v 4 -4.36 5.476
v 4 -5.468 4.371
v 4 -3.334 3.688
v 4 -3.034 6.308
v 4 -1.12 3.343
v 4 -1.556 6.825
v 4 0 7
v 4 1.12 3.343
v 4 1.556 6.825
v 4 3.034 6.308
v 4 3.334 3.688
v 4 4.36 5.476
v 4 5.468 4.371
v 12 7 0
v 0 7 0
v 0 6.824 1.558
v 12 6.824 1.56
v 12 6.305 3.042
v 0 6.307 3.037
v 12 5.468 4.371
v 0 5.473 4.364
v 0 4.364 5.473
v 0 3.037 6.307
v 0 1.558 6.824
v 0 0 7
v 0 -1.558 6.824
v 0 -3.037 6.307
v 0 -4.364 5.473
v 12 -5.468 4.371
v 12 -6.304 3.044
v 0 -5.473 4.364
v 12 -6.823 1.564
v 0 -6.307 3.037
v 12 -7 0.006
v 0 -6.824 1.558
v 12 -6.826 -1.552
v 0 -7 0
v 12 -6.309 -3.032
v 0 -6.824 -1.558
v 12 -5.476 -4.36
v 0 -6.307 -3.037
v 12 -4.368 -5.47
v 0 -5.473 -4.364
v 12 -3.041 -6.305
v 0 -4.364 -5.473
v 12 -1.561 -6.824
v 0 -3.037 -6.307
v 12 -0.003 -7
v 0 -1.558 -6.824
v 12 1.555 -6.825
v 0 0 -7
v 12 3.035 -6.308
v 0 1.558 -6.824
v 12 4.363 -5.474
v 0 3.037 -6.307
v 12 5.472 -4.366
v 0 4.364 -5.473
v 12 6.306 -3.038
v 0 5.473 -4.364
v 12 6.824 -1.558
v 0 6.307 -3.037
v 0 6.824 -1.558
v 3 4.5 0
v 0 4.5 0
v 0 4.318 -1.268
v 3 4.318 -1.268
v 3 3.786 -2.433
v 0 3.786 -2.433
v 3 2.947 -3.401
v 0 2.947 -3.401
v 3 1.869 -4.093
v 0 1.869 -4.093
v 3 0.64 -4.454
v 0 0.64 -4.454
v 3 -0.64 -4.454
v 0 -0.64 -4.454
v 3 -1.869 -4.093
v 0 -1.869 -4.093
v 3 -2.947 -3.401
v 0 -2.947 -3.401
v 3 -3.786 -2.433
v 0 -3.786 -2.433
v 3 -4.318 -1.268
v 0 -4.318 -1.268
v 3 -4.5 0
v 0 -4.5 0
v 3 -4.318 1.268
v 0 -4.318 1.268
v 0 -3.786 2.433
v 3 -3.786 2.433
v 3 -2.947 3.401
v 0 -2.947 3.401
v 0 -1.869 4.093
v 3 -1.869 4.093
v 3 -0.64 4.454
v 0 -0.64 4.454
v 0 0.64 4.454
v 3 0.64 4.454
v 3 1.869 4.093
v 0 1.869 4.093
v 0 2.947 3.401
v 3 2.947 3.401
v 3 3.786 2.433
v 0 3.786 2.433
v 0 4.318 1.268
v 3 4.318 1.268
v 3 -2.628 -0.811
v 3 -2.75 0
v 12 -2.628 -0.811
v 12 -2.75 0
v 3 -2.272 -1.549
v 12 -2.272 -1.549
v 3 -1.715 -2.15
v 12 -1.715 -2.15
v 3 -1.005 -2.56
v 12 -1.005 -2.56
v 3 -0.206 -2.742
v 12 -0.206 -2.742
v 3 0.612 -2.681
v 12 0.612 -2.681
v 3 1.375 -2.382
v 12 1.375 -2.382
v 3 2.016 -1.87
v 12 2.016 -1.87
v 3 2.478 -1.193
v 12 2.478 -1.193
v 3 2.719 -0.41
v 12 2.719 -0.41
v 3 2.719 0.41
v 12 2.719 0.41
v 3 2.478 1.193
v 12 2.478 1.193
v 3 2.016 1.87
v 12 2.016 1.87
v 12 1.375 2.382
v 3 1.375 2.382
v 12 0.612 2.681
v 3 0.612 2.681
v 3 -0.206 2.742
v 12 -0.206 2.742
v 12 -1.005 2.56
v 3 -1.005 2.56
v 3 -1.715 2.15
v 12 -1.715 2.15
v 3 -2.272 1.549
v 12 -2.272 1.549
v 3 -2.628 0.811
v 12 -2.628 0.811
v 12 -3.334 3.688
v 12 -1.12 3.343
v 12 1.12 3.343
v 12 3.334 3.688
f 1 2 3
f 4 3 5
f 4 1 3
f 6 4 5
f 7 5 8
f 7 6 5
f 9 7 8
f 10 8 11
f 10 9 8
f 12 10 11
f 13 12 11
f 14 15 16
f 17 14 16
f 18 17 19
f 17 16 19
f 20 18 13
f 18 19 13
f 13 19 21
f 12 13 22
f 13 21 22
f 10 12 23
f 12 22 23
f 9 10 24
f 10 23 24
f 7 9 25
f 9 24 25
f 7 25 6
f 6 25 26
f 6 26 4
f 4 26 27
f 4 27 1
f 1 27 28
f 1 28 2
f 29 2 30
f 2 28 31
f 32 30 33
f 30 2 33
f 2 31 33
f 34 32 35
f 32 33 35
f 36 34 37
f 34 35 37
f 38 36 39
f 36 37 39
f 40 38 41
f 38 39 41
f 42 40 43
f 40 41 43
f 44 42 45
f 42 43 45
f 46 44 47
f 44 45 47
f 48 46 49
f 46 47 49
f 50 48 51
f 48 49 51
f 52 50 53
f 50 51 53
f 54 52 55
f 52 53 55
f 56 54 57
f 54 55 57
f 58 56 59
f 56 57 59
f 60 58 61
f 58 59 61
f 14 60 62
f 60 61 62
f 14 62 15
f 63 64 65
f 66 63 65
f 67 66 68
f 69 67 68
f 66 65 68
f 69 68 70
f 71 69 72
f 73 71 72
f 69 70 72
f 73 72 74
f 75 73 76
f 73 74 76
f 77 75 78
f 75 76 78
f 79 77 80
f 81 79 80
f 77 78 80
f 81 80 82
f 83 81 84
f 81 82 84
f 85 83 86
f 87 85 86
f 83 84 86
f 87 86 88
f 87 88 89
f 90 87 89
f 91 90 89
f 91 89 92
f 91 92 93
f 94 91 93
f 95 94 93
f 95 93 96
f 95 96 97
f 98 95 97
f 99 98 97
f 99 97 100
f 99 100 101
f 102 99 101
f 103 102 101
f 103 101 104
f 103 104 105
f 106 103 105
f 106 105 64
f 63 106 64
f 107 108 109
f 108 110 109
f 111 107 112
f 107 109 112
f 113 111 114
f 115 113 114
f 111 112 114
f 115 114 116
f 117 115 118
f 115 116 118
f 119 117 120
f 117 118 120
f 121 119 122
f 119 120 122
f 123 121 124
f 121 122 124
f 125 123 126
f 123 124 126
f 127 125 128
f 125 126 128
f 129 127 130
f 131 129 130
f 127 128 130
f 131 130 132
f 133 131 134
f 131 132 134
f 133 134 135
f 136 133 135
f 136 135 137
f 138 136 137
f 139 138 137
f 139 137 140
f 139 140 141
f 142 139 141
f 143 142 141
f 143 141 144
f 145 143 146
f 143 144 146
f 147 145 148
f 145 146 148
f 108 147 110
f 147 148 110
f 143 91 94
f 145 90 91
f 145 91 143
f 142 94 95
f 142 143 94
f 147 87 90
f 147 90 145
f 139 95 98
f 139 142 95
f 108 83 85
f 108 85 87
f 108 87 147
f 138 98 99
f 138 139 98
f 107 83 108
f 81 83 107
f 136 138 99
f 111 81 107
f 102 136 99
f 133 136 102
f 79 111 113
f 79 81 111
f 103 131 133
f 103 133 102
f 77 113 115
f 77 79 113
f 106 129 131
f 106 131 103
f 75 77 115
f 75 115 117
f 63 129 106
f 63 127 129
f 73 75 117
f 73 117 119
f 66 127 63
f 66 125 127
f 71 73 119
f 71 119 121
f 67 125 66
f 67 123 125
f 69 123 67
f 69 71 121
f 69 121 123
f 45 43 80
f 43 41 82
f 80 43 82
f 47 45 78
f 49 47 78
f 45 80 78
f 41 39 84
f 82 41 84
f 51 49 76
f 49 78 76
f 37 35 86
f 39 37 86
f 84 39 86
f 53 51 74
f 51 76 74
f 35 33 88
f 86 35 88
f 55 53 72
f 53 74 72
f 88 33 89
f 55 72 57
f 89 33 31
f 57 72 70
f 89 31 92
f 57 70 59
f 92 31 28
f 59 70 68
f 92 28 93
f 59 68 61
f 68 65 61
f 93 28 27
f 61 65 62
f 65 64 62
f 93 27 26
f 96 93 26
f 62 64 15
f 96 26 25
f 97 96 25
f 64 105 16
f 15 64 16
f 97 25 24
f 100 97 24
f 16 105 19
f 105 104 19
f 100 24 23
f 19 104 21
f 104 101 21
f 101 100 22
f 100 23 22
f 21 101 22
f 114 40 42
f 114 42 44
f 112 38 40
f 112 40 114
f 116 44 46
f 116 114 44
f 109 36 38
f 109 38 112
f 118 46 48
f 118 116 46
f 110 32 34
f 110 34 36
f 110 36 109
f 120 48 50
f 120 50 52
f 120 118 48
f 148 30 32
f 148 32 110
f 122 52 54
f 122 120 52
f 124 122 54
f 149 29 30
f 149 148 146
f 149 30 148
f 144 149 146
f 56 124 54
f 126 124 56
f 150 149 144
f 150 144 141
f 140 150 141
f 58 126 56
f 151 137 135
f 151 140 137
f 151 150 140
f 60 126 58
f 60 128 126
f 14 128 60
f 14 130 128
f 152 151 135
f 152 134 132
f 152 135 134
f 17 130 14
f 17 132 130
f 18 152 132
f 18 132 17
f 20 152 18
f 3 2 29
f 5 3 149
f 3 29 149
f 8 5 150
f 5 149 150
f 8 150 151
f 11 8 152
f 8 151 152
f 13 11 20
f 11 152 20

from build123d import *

# Parameters (mm, degrees)
F0_R           = 7
F1_DEPTH       = 12
F2_D           = 5.5
F2_CBORE_D     = 9
F2_CBORE_DEPTH = 3
F4_DEPTH       = 8


with BuildPart() as f1:
    # F0 (on Right) → F1 (new body)
    with BuildSketch(Plane.YZ):
        Circle(F0_R)
    extrude(amount=F1_DEPTH)

    # F2 (through all)
    with Locations(Plane(origin=(0, 0, 0), x_dir=(0, 1, 0), z_dir=(-1, 0, 0))):
        with Locations((0, 0)):
            CounterBoreHole(F2_D / 2, F2_CBORE_D / 2, F2_CBORE_DEPTH)

    # F3 (on face) → F4 (cut)
    with BuildSketch(Plane.YZ.offset(12)):
        with BuildLine():
            ThreePointArc((5.467969, 4.370506), (0, 7), (-5.467969, 4.370506))
            ThreePointArc((-5.467969, 4.370506), (0, 3.3), (5.467969, 4.370506))
        make_face()
    extrude(amount=-F4_DEPTH, mode=Mode.SUBTRACT)


solid = f1.part
